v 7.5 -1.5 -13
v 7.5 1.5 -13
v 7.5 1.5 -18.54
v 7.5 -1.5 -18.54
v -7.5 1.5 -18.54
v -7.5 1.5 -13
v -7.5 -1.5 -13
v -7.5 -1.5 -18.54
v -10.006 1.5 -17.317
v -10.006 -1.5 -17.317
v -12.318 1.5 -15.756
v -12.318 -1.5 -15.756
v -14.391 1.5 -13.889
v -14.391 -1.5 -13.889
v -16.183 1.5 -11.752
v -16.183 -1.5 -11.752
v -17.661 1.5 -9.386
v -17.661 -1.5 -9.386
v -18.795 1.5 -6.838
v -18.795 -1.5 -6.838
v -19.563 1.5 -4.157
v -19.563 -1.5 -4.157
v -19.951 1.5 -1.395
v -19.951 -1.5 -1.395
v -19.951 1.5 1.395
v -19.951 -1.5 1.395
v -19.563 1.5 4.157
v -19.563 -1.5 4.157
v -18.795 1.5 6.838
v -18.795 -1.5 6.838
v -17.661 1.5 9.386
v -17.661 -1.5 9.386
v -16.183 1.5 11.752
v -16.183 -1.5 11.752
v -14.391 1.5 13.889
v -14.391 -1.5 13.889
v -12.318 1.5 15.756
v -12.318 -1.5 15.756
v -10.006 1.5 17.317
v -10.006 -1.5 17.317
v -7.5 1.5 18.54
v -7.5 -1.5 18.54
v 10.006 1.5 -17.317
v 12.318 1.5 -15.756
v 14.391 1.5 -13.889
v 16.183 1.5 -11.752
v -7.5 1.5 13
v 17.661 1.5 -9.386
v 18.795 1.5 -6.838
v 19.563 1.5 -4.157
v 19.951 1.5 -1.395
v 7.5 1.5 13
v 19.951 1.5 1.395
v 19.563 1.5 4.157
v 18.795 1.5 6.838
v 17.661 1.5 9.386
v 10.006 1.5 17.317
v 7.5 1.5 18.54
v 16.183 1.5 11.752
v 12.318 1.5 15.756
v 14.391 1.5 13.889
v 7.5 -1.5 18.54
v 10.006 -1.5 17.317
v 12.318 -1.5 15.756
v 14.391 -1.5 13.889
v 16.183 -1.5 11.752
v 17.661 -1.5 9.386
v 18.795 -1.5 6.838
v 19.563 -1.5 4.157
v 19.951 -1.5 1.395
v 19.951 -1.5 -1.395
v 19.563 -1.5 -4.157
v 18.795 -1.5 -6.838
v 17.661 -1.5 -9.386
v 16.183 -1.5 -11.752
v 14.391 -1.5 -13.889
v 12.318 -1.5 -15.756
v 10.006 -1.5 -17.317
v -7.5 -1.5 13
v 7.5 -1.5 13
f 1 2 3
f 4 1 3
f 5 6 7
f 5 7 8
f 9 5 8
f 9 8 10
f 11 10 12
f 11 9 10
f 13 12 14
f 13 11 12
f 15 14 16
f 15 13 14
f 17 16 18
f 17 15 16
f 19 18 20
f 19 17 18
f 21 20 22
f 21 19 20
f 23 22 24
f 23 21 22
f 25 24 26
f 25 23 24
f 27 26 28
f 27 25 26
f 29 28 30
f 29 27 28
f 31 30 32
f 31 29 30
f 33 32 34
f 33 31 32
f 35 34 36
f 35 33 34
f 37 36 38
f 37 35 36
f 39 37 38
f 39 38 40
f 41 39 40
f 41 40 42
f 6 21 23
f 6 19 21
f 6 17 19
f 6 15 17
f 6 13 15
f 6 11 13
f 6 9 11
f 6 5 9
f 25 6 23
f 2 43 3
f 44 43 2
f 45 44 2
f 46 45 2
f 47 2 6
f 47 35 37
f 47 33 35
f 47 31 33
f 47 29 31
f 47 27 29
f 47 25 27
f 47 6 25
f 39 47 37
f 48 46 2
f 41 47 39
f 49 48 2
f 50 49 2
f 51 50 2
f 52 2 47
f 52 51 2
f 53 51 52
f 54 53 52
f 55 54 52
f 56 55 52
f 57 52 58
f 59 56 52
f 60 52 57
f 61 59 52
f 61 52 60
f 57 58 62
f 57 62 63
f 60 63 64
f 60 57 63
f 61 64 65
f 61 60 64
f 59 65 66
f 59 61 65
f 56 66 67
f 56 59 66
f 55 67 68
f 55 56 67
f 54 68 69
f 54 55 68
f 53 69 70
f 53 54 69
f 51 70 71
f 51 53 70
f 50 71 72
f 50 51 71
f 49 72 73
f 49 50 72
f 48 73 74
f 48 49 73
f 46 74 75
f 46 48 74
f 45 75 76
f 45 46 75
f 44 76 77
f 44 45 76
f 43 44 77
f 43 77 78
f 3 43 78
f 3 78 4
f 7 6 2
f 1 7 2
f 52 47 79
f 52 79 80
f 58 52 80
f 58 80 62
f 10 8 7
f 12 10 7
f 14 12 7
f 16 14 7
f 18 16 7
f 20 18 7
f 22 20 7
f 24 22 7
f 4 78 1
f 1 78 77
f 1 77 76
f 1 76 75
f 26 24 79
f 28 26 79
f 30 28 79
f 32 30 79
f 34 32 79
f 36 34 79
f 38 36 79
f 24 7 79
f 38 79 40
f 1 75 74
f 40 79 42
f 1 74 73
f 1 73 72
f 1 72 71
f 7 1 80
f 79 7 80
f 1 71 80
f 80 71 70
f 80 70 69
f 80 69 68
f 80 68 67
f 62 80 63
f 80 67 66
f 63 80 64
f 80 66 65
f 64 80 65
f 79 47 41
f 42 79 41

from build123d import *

# Parameters (mm, degrees)
SKETCH1_R           = 20
BOSS_EXTRUDE1_DEPTH = 1.5
SKETCH3_W           = 15
SKETCH3_H           = 10
CUT_EXTRUDE2_DEPTH  = 3


with BuildPart() as part:
    # Sketch1 → Boss-Extrude1 (new, symmetric)
    with BuildSketch(Plane(origin=(0, 0, 0), x_dir=(1, 0, 0), z_dir=(0, 1, 0))):
        with Locations(Location((0, 0, 0), (0, 0, 270))):
            Circle(SKETCH1_R)
    extrude(amount=BOSS_EXTRUDE1_DEPTH, both=True)

    # Sketch3 → Cut-Extrude2 (cut)
    with BuildSketch(Plane(origin=(0, 1.5, 0), x_dir=(1, 0, 0), z_dir=(0, 1, 0))):
        with Locations((0, 18)):
            Rectangle(SKETCH3_W, SKETCH3_H)
    cut_extrude2 = extrude(amount=-CUT_EXTRUDE2_DEPTH, mode=Mode.SUBTRACT)

    # Mirror1: Cut-Extrude2 across plane
    add(cut_extrude2.mirror(Plane.XY), mode=Mode.SUBTRACT)


solid = part.part
